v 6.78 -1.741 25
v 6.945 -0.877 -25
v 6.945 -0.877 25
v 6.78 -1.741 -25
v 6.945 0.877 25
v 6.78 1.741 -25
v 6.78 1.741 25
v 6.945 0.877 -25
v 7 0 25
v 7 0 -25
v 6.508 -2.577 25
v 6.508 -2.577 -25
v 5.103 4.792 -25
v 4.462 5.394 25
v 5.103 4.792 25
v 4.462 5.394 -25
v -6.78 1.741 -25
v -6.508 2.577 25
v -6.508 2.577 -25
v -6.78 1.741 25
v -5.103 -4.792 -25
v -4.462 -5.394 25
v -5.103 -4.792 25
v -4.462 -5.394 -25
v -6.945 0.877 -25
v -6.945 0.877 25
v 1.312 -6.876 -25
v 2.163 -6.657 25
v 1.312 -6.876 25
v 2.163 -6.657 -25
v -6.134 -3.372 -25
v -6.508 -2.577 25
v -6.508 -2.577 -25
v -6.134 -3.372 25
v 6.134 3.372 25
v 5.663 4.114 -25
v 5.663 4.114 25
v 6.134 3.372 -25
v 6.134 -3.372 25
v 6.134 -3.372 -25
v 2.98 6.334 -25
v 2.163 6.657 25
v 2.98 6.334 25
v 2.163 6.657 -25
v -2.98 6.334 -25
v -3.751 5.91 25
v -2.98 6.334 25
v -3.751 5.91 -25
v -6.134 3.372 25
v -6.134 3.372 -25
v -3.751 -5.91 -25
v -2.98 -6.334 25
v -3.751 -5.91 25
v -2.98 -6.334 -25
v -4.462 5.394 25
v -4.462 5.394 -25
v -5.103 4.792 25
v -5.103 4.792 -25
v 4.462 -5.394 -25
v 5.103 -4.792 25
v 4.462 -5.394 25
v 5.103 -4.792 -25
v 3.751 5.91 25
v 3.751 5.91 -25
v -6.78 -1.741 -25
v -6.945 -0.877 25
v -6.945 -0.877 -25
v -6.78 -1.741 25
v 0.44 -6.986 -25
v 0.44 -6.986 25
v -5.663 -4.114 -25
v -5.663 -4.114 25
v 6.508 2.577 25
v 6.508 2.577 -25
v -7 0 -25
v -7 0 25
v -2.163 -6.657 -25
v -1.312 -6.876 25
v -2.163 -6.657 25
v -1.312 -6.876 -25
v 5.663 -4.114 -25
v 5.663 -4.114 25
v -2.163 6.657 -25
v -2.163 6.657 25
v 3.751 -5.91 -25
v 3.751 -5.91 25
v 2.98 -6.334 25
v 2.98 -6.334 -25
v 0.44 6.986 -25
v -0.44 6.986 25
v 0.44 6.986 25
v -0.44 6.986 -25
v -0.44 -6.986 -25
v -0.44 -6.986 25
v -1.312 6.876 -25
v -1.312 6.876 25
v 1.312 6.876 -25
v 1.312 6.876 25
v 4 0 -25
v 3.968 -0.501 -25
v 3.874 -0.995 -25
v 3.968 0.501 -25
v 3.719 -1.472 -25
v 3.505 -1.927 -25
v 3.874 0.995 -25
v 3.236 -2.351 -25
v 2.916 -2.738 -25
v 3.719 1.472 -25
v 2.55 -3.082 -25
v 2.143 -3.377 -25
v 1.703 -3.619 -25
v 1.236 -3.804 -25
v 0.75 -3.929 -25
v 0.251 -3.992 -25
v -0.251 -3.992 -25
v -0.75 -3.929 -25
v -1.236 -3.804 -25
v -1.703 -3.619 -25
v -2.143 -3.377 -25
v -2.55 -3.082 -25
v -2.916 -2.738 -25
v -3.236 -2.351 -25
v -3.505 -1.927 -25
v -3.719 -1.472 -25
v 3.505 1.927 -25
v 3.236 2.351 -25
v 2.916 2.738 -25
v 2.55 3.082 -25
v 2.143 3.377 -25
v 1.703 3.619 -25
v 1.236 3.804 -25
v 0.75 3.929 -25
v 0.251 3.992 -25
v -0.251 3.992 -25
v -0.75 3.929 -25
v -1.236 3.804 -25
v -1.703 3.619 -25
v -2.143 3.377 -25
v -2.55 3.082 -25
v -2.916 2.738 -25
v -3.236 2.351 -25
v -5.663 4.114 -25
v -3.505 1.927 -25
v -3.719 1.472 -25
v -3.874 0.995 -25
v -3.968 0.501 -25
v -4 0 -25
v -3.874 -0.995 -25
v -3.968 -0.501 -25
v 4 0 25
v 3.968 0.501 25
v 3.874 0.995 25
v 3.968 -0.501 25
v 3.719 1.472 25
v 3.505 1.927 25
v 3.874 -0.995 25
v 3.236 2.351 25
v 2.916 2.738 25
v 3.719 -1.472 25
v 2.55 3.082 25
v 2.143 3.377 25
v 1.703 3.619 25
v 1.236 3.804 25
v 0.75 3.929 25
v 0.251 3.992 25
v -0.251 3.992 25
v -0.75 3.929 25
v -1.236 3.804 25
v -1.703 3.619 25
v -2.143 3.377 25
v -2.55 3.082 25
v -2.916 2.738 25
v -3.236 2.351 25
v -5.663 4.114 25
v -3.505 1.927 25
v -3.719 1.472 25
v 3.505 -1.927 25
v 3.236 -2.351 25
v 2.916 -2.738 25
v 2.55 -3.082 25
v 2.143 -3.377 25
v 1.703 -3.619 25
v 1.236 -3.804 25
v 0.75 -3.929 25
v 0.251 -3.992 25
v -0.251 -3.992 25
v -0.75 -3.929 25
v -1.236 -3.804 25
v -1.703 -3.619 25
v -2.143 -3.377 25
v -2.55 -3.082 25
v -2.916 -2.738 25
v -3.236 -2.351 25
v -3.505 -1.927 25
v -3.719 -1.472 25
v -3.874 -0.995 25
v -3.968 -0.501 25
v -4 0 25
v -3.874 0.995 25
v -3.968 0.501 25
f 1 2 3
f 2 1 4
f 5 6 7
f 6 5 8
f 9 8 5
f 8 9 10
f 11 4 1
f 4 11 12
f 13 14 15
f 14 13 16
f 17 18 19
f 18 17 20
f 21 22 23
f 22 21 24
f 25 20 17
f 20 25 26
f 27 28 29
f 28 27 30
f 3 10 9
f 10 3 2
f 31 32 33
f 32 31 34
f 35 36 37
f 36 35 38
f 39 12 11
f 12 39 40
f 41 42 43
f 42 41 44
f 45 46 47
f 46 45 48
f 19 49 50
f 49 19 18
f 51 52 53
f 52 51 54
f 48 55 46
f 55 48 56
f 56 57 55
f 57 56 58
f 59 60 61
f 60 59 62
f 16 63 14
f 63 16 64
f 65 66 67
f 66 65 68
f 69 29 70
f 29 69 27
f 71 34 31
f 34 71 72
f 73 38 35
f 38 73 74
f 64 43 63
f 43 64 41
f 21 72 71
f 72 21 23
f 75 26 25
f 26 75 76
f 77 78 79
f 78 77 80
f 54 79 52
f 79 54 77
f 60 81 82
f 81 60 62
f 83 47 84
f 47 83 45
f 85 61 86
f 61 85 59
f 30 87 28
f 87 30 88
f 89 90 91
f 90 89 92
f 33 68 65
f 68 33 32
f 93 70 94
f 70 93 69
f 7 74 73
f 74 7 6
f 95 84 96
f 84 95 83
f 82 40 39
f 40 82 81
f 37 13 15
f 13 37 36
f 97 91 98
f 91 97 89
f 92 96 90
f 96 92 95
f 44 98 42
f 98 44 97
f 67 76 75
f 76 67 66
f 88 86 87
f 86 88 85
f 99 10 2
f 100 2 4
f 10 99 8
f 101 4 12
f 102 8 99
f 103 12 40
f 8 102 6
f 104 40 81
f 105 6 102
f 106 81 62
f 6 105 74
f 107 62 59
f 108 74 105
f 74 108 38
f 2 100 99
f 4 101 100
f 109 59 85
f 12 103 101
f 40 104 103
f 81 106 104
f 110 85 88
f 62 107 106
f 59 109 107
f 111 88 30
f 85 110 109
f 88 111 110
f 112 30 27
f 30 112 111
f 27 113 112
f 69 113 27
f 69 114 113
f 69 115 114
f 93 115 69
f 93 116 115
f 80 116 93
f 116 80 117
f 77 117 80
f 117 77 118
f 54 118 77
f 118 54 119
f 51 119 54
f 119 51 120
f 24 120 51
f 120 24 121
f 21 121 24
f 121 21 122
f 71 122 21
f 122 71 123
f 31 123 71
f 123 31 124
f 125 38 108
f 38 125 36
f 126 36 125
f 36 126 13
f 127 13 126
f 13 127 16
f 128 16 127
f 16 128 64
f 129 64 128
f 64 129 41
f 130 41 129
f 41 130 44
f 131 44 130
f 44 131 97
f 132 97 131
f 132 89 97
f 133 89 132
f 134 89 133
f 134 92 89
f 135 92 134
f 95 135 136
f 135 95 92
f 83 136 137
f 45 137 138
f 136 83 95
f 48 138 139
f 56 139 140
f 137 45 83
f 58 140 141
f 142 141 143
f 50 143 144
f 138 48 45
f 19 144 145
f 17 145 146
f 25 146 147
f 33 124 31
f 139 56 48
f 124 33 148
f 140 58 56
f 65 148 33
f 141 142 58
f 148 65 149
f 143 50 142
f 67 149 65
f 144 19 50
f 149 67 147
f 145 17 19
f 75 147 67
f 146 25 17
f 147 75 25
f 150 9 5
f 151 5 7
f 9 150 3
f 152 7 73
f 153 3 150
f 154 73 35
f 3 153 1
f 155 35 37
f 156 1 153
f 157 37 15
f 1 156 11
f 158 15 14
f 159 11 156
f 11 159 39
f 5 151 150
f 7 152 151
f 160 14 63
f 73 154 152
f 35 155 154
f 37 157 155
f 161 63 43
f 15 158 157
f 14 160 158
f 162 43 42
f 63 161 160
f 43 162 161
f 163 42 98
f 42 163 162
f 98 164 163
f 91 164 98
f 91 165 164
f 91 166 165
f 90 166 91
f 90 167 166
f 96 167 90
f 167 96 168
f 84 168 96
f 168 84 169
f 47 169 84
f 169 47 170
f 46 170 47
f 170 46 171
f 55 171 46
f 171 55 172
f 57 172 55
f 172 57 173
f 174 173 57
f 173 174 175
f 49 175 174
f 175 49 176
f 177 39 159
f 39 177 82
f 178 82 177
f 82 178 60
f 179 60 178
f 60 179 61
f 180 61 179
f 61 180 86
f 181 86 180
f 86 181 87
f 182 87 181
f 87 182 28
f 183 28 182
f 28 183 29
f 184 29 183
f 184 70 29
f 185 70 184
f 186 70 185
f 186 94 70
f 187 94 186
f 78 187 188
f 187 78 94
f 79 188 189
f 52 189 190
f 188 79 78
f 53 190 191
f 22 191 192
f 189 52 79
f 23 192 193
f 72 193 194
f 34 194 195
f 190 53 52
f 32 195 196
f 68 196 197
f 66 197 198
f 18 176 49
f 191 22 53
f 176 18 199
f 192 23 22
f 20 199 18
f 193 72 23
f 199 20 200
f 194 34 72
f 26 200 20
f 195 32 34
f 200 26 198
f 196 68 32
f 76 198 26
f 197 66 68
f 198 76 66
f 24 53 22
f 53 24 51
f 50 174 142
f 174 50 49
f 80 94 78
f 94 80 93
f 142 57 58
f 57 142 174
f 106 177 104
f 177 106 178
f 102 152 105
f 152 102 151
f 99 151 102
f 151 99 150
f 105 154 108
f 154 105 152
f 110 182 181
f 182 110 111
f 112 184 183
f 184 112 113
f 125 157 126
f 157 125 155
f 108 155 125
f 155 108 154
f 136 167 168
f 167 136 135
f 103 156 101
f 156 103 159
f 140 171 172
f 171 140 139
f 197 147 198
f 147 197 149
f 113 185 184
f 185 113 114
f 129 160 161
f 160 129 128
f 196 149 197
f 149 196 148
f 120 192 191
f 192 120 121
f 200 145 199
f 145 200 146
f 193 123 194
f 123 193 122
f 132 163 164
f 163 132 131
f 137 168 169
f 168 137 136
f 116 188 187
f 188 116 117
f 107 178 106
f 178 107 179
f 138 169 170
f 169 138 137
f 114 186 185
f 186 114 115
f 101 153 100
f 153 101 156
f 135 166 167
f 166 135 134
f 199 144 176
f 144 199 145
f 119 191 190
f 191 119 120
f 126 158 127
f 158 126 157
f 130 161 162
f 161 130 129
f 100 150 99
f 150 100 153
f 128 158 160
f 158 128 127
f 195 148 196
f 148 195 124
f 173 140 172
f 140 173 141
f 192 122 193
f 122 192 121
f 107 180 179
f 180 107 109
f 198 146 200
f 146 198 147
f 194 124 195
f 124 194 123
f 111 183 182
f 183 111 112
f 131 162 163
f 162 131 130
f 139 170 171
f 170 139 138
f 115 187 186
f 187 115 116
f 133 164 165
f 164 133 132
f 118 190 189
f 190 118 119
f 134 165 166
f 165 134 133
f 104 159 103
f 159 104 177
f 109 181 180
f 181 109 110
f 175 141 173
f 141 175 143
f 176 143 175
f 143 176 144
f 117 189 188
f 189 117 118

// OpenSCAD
$fn = 50;


difference() {
	union() {
		translate(v = [0, 0, -25.0000000000]) {
			cylinder(h = 50, r = 7.0000000000);
		}
	}
	union() {
		translate(v = [0, 0, -100.0000000000]) {
			cylinder(h = 200, r = 4.0000000000);
		}
	}
}
